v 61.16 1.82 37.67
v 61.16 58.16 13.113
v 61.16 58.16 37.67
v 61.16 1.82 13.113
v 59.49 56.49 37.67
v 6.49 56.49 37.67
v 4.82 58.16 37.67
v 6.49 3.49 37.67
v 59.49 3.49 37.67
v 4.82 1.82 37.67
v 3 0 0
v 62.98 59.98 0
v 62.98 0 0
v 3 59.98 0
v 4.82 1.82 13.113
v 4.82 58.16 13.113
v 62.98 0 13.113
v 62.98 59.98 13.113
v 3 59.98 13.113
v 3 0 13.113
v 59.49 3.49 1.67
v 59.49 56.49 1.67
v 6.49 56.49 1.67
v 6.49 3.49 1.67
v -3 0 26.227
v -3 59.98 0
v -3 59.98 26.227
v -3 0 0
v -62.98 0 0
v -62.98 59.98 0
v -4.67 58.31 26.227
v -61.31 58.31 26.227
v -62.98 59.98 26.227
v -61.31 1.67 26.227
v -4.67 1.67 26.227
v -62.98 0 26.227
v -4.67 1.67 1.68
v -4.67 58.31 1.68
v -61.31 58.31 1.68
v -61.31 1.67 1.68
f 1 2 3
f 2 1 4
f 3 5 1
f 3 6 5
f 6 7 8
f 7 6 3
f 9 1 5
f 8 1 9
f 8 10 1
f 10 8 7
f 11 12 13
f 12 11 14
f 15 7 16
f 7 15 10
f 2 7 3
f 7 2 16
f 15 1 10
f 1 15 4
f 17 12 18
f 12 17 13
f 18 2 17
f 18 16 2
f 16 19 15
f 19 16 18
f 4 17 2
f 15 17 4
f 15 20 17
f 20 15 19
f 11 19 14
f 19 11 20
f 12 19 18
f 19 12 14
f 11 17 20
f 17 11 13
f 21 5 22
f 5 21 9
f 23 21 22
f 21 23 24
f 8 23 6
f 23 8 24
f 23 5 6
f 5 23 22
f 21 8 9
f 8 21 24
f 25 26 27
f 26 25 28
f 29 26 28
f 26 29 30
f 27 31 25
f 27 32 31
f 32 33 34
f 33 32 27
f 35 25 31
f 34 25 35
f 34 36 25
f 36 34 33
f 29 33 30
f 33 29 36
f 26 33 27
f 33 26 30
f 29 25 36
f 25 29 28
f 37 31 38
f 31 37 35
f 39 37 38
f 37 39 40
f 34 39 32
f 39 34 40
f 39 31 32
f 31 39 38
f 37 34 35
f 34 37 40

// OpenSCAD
iw = 53;
ih = 36;
twt = 1.67;
slop = .15;
frac = 0.3333333333333333;//[0.08333333333333333:0.08333333333333333:1]
oh = ih + 2 * twt + slop;
ow = iw + 4 * twt + 2 * slop;
module bottom() {
    difference() {
        union() {
            translate([twt + slop, twt + slop, 0]) cube([iw + 2 * twt, iw + 2 * twt, ih + 1 * twt]);
            translate([0, 0, 0]) cube([ow, ow, (oh - slop) * frac]);
        }
        translate([2 * twt + slop, 2 * twt + slop, twt]) cube([iw, iw, ih + .01]);
    }
}
module top() {
    difference() {
        cube([ow, ow, (oh - slop) * (1 - frac)]);
        translate([twt, twt, - .01]) cube([ow - 2 * twt, ow - 2 * twt, (oh - slop) * (1 - frac) - twt]);
    }
}

if($preview) difference() {
    union() {
        bottom();
        translate([0, 0, oh - (oh - slop) * (1 - frac)]) top();
    }
    translate([ow / 2, - 1, - 1]) cube(ow * 2);
} else {
        translate([3,0,0]) bottom();
        translate([-ow-3,0,(oh - slop) * (1 - frac)]) mirror([0,0,1]) top();
}
